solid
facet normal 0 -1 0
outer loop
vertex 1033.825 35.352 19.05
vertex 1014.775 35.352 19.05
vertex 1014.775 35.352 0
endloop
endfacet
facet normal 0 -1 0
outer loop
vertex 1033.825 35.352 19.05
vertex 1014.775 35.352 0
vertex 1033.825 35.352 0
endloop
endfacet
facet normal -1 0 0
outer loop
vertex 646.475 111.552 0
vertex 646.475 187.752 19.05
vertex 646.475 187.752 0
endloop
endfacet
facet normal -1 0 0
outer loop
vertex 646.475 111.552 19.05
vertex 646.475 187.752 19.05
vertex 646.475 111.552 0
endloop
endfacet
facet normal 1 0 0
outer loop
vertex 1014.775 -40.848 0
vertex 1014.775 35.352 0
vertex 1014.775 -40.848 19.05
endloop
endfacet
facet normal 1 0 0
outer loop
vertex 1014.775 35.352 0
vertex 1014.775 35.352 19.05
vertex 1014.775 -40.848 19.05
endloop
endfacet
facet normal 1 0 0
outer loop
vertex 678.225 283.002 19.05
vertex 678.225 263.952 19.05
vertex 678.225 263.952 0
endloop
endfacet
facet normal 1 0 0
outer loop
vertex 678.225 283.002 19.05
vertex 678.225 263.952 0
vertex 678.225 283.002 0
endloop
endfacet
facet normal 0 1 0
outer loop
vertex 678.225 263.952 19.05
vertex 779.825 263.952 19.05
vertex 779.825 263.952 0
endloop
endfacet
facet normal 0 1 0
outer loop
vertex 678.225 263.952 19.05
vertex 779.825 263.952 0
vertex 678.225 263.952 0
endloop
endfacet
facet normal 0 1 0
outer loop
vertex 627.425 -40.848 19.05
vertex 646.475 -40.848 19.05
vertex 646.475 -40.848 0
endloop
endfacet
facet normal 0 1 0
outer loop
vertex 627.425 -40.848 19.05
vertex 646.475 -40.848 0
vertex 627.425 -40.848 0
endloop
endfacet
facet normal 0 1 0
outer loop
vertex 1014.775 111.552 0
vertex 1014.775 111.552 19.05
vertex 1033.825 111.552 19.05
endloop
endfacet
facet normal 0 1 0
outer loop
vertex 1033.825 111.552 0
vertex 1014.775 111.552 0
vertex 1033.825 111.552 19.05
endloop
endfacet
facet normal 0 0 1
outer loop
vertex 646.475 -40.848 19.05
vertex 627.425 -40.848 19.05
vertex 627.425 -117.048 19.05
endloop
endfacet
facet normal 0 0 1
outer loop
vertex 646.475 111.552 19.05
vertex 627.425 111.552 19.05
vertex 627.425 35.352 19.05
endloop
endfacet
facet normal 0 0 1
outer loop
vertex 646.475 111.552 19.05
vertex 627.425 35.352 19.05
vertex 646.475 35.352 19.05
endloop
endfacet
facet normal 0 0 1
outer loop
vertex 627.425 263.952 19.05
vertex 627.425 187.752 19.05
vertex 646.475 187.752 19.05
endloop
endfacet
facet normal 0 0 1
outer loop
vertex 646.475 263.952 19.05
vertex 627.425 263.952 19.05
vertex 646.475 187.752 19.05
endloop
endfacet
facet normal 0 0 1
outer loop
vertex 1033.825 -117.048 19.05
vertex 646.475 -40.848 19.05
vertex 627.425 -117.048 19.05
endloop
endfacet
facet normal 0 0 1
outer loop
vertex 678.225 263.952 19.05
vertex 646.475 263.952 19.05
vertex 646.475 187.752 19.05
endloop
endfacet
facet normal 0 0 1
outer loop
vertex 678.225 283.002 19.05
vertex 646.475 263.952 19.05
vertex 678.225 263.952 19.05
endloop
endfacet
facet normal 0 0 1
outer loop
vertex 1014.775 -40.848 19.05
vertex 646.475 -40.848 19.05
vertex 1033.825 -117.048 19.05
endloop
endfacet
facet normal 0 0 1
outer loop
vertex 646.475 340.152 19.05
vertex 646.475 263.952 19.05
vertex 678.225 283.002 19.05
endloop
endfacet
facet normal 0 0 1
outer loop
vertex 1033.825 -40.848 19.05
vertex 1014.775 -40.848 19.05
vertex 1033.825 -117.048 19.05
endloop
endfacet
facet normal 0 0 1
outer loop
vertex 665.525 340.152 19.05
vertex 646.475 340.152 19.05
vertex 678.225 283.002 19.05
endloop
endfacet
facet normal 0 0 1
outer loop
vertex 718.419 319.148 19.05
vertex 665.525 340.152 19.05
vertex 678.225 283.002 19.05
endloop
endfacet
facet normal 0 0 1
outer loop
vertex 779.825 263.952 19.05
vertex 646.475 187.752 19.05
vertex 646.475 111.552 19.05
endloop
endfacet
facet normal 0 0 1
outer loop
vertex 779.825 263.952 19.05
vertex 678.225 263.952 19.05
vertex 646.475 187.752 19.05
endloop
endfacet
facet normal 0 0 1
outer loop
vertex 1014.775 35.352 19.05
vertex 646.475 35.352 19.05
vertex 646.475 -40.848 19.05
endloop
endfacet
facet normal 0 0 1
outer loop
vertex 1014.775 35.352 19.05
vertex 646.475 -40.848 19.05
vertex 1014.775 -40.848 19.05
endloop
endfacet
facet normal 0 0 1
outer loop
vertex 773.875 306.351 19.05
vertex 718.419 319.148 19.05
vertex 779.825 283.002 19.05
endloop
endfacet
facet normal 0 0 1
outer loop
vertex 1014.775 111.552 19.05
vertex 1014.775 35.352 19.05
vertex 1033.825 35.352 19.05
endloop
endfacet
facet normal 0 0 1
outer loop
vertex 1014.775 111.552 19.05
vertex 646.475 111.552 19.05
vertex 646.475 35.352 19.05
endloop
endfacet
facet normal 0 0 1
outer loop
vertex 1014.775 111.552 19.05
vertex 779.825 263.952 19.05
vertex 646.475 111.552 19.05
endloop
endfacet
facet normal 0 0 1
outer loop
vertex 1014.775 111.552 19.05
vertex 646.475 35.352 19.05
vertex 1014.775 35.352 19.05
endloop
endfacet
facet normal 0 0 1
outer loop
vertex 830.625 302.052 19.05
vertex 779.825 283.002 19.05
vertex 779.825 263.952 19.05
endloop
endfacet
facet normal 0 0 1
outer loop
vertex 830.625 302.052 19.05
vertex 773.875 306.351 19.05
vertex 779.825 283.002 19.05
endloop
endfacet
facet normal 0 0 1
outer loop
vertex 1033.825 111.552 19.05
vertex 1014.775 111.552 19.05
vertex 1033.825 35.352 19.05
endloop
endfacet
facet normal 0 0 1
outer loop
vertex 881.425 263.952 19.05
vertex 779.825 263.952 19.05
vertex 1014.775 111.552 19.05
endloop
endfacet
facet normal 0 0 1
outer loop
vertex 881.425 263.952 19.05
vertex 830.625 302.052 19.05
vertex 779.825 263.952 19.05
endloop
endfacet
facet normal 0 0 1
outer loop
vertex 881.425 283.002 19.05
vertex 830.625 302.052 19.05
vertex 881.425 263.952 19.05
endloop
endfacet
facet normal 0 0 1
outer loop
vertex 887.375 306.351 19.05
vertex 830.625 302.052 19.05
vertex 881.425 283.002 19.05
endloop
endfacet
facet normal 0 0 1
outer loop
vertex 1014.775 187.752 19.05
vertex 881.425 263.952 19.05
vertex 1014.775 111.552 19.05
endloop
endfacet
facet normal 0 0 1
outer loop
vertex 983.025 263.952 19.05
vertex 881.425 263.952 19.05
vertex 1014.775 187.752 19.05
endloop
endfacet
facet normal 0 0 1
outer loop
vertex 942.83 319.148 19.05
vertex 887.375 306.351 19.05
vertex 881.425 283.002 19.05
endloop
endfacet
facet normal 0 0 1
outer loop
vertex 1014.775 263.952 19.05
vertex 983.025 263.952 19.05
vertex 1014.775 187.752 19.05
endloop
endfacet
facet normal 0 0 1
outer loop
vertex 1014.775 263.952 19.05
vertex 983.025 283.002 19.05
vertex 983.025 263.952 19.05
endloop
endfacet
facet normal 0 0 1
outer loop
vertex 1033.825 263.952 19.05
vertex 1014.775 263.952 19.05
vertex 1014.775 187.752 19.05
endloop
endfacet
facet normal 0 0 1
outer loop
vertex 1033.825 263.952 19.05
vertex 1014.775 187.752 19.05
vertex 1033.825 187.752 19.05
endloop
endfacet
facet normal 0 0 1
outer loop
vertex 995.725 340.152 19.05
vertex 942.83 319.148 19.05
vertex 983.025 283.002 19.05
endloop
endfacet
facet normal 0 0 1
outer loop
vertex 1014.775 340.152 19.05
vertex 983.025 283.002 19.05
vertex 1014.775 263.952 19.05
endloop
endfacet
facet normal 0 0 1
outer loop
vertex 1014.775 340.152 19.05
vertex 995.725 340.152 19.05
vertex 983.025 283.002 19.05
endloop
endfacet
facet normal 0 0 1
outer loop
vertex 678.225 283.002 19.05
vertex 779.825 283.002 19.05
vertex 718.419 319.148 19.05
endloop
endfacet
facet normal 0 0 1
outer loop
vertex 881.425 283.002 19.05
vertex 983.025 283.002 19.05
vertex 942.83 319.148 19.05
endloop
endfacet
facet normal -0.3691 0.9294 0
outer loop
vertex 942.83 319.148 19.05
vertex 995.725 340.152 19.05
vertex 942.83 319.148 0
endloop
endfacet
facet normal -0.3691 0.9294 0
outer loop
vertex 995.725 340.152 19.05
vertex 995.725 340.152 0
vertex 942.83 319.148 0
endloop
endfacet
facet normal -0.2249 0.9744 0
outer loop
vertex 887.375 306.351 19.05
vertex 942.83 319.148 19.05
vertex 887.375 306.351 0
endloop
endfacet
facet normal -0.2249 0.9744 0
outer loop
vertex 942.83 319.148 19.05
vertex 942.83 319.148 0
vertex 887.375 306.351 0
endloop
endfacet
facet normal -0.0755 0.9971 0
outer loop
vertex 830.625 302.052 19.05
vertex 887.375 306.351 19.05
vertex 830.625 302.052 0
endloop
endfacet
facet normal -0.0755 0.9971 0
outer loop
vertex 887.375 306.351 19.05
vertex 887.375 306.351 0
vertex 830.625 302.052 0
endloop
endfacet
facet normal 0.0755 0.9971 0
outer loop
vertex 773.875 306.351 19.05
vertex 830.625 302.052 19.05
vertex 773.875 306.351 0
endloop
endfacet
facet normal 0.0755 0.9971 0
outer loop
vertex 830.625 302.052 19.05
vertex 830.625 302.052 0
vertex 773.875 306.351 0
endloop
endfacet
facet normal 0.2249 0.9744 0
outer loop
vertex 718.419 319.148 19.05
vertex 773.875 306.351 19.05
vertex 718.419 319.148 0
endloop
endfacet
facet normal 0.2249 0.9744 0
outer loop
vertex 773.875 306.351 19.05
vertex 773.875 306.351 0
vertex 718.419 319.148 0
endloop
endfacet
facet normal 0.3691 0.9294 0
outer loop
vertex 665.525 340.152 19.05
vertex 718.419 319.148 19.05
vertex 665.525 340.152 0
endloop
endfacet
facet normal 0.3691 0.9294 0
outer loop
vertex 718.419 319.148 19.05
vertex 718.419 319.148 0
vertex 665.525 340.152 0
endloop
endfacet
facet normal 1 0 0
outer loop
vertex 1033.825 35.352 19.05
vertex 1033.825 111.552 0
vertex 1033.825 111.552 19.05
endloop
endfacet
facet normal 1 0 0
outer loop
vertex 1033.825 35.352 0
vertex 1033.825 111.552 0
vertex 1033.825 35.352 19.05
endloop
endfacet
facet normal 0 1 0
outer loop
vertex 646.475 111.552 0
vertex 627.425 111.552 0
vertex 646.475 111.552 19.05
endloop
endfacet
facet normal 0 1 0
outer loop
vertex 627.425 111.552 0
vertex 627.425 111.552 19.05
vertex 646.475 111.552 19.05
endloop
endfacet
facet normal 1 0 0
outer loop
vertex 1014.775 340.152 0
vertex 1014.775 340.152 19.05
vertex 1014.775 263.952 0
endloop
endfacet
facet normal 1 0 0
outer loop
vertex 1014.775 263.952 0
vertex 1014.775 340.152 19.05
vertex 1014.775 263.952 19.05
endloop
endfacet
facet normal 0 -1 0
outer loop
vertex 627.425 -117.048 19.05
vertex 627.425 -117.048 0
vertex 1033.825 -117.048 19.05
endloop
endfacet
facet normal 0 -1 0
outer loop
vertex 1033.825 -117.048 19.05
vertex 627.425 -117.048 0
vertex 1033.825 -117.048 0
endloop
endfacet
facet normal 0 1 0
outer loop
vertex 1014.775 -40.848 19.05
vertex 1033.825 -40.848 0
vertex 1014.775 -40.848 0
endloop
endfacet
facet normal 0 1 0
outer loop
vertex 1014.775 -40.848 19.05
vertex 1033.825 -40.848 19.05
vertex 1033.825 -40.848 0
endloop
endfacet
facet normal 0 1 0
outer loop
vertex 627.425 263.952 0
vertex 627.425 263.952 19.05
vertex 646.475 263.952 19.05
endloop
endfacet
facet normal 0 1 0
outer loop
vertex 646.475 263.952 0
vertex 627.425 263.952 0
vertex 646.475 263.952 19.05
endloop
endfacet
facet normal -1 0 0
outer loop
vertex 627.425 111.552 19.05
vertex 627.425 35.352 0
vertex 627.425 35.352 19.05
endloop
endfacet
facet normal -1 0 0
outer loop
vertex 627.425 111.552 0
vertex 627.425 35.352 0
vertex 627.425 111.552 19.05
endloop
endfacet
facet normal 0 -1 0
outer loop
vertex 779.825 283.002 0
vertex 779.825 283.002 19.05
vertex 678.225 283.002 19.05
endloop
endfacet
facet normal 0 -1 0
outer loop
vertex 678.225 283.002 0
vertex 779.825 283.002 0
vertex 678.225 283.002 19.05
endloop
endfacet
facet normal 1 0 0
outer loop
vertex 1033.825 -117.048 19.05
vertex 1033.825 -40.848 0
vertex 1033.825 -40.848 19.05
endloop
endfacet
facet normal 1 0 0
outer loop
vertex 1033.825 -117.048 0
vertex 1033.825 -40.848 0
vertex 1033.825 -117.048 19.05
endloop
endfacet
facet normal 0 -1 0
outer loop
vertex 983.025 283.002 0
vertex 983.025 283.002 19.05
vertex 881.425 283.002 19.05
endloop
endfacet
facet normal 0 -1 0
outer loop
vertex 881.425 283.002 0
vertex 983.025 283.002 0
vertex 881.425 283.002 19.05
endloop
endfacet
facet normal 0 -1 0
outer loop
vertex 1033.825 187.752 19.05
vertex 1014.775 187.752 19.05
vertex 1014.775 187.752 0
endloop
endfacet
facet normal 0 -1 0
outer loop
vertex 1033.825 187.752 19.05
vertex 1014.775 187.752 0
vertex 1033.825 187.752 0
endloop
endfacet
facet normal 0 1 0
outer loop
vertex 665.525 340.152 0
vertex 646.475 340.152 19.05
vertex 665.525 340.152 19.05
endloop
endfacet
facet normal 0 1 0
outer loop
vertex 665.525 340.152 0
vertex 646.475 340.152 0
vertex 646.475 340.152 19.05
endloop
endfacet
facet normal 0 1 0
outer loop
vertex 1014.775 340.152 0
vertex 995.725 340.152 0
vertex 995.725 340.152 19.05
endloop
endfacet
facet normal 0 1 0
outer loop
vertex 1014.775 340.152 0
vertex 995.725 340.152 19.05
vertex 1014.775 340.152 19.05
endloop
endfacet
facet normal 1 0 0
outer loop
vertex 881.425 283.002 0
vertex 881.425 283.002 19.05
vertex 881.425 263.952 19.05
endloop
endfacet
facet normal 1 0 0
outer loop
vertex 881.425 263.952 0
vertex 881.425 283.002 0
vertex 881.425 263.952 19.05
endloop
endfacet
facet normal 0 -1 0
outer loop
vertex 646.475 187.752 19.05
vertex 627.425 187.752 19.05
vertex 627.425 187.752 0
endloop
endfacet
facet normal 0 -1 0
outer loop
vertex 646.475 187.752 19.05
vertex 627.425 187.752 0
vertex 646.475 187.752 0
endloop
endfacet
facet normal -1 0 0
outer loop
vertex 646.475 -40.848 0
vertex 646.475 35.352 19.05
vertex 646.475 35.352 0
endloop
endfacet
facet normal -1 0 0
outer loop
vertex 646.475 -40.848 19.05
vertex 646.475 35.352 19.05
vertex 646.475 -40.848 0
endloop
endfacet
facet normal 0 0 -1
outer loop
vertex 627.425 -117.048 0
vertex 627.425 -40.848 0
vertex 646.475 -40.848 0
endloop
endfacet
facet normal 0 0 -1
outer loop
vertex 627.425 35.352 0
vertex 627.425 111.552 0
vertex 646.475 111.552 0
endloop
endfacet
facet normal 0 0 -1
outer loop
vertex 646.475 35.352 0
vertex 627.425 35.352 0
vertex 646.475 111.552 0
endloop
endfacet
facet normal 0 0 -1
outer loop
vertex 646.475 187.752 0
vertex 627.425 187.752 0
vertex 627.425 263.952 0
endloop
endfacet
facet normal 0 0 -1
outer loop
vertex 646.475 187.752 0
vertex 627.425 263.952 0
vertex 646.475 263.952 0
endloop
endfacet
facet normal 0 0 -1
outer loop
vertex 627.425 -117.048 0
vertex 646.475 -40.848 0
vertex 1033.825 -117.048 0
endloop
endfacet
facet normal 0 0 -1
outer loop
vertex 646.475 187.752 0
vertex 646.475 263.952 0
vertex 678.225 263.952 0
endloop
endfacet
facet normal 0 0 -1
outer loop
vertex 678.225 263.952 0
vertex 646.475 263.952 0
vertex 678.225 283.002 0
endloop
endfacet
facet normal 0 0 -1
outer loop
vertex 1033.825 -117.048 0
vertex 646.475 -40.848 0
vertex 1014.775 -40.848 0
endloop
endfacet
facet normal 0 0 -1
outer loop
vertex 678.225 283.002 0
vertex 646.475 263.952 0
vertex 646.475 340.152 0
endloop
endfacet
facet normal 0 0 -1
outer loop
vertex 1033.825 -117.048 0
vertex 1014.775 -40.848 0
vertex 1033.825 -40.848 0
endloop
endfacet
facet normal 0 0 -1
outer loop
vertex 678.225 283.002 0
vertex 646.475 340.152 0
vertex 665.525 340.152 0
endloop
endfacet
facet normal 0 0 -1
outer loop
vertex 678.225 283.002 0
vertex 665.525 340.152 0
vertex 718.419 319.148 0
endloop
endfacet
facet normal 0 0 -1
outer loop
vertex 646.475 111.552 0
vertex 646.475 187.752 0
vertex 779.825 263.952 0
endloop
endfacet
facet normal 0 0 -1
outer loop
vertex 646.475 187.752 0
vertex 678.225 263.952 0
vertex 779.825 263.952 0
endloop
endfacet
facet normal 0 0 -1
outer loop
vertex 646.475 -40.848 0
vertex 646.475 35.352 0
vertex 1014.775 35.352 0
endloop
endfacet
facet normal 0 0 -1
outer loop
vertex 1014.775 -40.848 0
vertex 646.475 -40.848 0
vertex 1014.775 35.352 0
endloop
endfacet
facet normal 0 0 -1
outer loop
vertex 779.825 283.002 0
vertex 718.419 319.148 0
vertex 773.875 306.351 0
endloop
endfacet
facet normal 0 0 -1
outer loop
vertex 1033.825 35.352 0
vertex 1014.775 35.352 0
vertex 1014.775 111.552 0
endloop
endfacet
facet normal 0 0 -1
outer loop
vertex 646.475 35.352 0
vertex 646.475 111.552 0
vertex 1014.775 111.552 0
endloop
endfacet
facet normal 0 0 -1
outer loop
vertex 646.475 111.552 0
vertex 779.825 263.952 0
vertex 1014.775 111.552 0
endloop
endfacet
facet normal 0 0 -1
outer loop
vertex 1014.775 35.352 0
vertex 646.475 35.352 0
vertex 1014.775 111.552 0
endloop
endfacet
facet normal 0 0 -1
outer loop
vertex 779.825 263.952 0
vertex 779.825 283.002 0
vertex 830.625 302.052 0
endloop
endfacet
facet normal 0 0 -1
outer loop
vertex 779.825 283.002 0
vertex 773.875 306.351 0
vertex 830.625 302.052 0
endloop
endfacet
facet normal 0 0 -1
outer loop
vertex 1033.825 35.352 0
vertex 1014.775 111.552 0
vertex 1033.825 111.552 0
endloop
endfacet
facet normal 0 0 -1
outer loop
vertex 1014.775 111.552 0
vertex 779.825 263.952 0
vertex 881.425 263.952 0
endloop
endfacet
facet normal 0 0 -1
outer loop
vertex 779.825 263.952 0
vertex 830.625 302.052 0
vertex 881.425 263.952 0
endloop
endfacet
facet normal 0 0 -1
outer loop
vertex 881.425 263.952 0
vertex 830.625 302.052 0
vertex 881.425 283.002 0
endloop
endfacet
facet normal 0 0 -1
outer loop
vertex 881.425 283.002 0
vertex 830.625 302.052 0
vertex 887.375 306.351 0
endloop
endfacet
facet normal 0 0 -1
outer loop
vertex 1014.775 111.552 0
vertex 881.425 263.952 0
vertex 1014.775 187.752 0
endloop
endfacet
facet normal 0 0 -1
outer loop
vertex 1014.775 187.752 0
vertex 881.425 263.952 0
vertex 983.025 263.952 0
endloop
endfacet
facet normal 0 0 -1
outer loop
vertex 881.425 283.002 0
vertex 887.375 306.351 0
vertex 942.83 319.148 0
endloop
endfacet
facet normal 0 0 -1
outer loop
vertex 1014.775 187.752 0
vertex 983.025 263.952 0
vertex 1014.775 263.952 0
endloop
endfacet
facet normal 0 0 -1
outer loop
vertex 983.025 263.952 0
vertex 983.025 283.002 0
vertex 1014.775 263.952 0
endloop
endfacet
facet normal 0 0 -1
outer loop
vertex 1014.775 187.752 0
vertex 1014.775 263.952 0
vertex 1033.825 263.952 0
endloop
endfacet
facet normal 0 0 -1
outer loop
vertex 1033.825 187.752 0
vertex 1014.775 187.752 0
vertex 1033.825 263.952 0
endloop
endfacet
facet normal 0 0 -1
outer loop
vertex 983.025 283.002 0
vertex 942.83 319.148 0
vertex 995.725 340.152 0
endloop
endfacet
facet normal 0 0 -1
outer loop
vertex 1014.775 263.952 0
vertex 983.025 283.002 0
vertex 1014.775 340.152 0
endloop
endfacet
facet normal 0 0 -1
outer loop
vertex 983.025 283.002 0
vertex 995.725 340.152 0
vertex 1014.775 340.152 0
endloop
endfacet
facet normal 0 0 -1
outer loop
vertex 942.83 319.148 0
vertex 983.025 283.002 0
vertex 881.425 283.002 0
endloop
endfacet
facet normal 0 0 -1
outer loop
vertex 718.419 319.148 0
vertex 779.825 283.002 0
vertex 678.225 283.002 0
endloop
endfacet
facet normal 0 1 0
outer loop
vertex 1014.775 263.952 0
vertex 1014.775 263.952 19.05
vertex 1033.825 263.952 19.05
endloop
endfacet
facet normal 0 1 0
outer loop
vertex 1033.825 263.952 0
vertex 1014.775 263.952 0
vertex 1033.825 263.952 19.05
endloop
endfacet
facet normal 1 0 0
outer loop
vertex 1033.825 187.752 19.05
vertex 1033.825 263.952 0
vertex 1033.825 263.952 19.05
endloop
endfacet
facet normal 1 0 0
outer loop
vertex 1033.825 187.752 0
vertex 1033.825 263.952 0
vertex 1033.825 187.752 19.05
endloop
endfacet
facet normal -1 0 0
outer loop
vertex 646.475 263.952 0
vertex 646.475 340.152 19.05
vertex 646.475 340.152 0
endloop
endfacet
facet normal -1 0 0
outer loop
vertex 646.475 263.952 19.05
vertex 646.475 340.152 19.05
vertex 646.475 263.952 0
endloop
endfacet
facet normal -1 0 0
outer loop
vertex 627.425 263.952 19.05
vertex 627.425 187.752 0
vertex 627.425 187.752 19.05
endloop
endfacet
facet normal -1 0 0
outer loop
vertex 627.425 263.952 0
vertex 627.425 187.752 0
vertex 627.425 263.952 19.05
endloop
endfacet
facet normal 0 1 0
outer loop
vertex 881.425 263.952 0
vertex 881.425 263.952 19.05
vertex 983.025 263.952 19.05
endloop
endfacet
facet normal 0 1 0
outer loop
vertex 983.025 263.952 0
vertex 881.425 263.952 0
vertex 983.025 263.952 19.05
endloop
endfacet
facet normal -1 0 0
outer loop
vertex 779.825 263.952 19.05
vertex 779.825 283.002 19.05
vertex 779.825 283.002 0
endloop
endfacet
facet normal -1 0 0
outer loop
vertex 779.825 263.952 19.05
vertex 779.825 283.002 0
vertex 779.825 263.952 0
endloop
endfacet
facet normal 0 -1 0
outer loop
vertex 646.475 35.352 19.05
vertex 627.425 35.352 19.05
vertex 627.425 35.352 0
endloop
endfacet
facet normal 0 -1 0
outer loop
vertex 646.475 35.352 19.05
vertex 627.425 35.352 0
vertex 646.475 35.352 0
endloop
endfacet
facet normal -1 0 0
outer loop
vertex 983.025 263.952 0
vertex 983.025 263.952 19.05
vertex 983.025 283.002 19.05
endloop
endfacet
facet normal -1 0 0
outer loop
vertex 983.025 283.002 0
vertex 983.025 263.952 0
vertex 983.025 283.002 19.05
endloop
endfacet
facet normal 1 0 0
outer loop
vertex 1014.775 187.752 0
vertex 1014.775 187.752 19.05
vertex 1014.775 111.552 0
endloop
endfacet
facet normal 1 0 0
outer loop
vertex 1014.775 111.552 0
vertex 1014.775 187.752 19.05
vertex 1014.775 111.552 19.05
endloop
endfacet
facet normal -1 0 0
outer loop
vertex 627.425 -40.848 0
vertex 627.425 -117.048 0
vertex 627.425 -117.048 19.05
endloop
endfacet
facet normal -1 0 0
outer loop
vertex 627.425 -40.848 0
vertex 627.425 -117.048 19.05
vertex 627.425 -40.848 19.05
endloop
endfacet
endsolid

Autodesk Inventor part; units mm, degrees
ref_plane "YZ Plane" through (0, 0, 0) normal (1, 0, 0) x (0, 1, 0)
ref_plane "XZ Plane" through (0, 0, 0) normal (0, 1, 0) x (-1, 0, 0)
ref_plane "XY Plane" through (0, 0, 0) normal (0, 0, 1) x (1, 0, 0)
sketch "Sketch1" plane through (0, 0, 0) normal (0, 0, 1) x (1, 0, 0)
  line L0 (1033.8246, 340.1521) -> (1033.8246, -117.0479)
  line L1 (627.4246, -117.0479) -> (627.4246, 340.1521)
  line L2 (627.4246, -117.0479) -> (1033.8246, -117.0479)
  arc A0 (665.5246, 340.1521) -> (995.7246, 340.1521) centre (830.6246, 678.8187) ccw
  line L3 (627.4246, 340.1521) -> (665.5246, 340.1521)
  line L4 (995.7246, 340.1521) -> (1033.8246, 340.1521)
  point P0 (0, 0)
  dimension "d0" = 406.4
  dimension "d1" = 457.2
extrude "Extrusion1" add sketch "Sketch1" along normal blind 19.05
sketch "Sketch2" plane through (0, 0, 19.05) normal (0, 0, 1) x (1, 0, 0)
  line L0 (1033.8246, 340.1521) -> (627.4246, 340.1521) projected
  line L1 (627.4246, -117.0479) -> (-960.0754, -117.0479) projected
  line L2 (627.4246, 340.1521) -> (646.4746, 340.1521)
  line L3 (646.4746, 340.1521) -> (646.4746, -117.0479)
  line L4 (646.4746, -117.0479) -> (627.4246, -117.0479)
  line L5 (627.4246, -117.0479) -> (627.4246, 340.1521)
  line L6 (1033.8246, -117.0479) -> (1033.8246, 340.1521) projected
  line L7 (1033.8246, 340.1521) -> (1014.7746, 340.1521)
  line L8 (1014.7746, 340.1521) -> (1014.7746, -117.0479)
  line L9 (1014.7746, -117.0479) -> (1033.8246, -117.0479)
  line L10 (1033.8246, -117.0479) -> (1033.8246, 340.1521)
  line L11 (627.4246, 340.1521) -> (627.4246, -117.0479) projected
  line L12 (627.4246, 263.9521) -> (646.4746, 263.9521)
  line L13 (1014.7746, 263.9521) -> (1033.8246, 263.9521)
  line L14 (627.4246, 187.7521) -> (646.4746, 187.7521)
  line L15 (1014.7746, 187.7521) -> (1033.8246, 187.7521)
  line L16 (627.4246, 111.5521) -> (646.4746, 111.5521)
  line L17 (1014.7746, 111.5521) -> (1033.8246, 111.5521)
  line L18 (627.4246, 35.3521) -> (646.4746, 35.3521)
  line L19 (1014.7746, 35.3521) -> (1033.8246, 35.3521)
  line L20 (1033.8246, -40.8479) -> (1014.7746, -40.8479)
  line L21 (646.4746, -40.8479) -> (627.4246, -40.8479)
  point P0 (0, 0)
  dimension "d7" = 19.05
  dimension "d8" = 19.05
extrude "Extrusion2" cut sketch "Sketch2" against normal blind 19.05 contours L6 L13 L8 L0 | L3 L12 L5 L0 | L6 L17 L8 L15 | L3 L16 L5 L14 | L6 L20 L8 L19 | L3 L21 L5 L18
sketch "Sketch3" plane through (0, 0, 19.05) normal (0, 0, 1) x (1, 0, 0)
  line L0 (1131.5205, 302.0521) -> (511.2286, 302.0521)
  line L1 (1014.7746, 340.1521) -> (995.7246, 340.1521) projected
  line L2 (1127.4261, 283.0021) -> (305.147, 283.0021)
  line L3 (830.6246, 74.0239) -> (830.6246, 388.6053)
  line L4 (1033.8246, 187.7521) -> (1033.8246, 263.9521) projected
  line L5 (983.0246, 283.0021) -> (881.4246, 283.0021)
  line L6 (881.4246, 283.0021) -> (881.4246, 263.9521)
  line L7 (881.4246, 263.9521) -> (983.0246, 263.9521)
  line L8 (983.0246, 263.9521) -> (983.0246, 283.0021)
  line L9 (1014.7746, 263.9521) -> (1014.7746, 340.1521) projected
  line L10 (678.2246, 283.0021) -> (779.8246, 283.0021)
  line L11 (779.8246, 283.0021) -> (779.8246, 263.9521)
  line L12 (779.8246, 263.9521) -> (678.2246, 263.9521)
  line L13 (678.2246, 263.9521) -> (678.2246, 283.0021)
  line L14 (646.4746, 340.1521) -> (646.4746, 263.9521) projected
  point P0 (0, 0)
  dimension "d24" = 38.1
  dimension "d25" = 19.05
  dimension "d26" = 203.2
  dimension "d27" = 31.75
  dimension "d28" = 101.6
  dimension "d29" = 19.05
  dimension "d30" = 31.75
  dimension "d31" = 101.6
  dimension "d32" = 19.05
extrude "Extrusion3" cut sketch "Sketch3" against normal blind 25.4 contours L8 L7 L6 L2 | L11 L12 L13 L2
properties part number "right side" material "Wood (Birch)"
